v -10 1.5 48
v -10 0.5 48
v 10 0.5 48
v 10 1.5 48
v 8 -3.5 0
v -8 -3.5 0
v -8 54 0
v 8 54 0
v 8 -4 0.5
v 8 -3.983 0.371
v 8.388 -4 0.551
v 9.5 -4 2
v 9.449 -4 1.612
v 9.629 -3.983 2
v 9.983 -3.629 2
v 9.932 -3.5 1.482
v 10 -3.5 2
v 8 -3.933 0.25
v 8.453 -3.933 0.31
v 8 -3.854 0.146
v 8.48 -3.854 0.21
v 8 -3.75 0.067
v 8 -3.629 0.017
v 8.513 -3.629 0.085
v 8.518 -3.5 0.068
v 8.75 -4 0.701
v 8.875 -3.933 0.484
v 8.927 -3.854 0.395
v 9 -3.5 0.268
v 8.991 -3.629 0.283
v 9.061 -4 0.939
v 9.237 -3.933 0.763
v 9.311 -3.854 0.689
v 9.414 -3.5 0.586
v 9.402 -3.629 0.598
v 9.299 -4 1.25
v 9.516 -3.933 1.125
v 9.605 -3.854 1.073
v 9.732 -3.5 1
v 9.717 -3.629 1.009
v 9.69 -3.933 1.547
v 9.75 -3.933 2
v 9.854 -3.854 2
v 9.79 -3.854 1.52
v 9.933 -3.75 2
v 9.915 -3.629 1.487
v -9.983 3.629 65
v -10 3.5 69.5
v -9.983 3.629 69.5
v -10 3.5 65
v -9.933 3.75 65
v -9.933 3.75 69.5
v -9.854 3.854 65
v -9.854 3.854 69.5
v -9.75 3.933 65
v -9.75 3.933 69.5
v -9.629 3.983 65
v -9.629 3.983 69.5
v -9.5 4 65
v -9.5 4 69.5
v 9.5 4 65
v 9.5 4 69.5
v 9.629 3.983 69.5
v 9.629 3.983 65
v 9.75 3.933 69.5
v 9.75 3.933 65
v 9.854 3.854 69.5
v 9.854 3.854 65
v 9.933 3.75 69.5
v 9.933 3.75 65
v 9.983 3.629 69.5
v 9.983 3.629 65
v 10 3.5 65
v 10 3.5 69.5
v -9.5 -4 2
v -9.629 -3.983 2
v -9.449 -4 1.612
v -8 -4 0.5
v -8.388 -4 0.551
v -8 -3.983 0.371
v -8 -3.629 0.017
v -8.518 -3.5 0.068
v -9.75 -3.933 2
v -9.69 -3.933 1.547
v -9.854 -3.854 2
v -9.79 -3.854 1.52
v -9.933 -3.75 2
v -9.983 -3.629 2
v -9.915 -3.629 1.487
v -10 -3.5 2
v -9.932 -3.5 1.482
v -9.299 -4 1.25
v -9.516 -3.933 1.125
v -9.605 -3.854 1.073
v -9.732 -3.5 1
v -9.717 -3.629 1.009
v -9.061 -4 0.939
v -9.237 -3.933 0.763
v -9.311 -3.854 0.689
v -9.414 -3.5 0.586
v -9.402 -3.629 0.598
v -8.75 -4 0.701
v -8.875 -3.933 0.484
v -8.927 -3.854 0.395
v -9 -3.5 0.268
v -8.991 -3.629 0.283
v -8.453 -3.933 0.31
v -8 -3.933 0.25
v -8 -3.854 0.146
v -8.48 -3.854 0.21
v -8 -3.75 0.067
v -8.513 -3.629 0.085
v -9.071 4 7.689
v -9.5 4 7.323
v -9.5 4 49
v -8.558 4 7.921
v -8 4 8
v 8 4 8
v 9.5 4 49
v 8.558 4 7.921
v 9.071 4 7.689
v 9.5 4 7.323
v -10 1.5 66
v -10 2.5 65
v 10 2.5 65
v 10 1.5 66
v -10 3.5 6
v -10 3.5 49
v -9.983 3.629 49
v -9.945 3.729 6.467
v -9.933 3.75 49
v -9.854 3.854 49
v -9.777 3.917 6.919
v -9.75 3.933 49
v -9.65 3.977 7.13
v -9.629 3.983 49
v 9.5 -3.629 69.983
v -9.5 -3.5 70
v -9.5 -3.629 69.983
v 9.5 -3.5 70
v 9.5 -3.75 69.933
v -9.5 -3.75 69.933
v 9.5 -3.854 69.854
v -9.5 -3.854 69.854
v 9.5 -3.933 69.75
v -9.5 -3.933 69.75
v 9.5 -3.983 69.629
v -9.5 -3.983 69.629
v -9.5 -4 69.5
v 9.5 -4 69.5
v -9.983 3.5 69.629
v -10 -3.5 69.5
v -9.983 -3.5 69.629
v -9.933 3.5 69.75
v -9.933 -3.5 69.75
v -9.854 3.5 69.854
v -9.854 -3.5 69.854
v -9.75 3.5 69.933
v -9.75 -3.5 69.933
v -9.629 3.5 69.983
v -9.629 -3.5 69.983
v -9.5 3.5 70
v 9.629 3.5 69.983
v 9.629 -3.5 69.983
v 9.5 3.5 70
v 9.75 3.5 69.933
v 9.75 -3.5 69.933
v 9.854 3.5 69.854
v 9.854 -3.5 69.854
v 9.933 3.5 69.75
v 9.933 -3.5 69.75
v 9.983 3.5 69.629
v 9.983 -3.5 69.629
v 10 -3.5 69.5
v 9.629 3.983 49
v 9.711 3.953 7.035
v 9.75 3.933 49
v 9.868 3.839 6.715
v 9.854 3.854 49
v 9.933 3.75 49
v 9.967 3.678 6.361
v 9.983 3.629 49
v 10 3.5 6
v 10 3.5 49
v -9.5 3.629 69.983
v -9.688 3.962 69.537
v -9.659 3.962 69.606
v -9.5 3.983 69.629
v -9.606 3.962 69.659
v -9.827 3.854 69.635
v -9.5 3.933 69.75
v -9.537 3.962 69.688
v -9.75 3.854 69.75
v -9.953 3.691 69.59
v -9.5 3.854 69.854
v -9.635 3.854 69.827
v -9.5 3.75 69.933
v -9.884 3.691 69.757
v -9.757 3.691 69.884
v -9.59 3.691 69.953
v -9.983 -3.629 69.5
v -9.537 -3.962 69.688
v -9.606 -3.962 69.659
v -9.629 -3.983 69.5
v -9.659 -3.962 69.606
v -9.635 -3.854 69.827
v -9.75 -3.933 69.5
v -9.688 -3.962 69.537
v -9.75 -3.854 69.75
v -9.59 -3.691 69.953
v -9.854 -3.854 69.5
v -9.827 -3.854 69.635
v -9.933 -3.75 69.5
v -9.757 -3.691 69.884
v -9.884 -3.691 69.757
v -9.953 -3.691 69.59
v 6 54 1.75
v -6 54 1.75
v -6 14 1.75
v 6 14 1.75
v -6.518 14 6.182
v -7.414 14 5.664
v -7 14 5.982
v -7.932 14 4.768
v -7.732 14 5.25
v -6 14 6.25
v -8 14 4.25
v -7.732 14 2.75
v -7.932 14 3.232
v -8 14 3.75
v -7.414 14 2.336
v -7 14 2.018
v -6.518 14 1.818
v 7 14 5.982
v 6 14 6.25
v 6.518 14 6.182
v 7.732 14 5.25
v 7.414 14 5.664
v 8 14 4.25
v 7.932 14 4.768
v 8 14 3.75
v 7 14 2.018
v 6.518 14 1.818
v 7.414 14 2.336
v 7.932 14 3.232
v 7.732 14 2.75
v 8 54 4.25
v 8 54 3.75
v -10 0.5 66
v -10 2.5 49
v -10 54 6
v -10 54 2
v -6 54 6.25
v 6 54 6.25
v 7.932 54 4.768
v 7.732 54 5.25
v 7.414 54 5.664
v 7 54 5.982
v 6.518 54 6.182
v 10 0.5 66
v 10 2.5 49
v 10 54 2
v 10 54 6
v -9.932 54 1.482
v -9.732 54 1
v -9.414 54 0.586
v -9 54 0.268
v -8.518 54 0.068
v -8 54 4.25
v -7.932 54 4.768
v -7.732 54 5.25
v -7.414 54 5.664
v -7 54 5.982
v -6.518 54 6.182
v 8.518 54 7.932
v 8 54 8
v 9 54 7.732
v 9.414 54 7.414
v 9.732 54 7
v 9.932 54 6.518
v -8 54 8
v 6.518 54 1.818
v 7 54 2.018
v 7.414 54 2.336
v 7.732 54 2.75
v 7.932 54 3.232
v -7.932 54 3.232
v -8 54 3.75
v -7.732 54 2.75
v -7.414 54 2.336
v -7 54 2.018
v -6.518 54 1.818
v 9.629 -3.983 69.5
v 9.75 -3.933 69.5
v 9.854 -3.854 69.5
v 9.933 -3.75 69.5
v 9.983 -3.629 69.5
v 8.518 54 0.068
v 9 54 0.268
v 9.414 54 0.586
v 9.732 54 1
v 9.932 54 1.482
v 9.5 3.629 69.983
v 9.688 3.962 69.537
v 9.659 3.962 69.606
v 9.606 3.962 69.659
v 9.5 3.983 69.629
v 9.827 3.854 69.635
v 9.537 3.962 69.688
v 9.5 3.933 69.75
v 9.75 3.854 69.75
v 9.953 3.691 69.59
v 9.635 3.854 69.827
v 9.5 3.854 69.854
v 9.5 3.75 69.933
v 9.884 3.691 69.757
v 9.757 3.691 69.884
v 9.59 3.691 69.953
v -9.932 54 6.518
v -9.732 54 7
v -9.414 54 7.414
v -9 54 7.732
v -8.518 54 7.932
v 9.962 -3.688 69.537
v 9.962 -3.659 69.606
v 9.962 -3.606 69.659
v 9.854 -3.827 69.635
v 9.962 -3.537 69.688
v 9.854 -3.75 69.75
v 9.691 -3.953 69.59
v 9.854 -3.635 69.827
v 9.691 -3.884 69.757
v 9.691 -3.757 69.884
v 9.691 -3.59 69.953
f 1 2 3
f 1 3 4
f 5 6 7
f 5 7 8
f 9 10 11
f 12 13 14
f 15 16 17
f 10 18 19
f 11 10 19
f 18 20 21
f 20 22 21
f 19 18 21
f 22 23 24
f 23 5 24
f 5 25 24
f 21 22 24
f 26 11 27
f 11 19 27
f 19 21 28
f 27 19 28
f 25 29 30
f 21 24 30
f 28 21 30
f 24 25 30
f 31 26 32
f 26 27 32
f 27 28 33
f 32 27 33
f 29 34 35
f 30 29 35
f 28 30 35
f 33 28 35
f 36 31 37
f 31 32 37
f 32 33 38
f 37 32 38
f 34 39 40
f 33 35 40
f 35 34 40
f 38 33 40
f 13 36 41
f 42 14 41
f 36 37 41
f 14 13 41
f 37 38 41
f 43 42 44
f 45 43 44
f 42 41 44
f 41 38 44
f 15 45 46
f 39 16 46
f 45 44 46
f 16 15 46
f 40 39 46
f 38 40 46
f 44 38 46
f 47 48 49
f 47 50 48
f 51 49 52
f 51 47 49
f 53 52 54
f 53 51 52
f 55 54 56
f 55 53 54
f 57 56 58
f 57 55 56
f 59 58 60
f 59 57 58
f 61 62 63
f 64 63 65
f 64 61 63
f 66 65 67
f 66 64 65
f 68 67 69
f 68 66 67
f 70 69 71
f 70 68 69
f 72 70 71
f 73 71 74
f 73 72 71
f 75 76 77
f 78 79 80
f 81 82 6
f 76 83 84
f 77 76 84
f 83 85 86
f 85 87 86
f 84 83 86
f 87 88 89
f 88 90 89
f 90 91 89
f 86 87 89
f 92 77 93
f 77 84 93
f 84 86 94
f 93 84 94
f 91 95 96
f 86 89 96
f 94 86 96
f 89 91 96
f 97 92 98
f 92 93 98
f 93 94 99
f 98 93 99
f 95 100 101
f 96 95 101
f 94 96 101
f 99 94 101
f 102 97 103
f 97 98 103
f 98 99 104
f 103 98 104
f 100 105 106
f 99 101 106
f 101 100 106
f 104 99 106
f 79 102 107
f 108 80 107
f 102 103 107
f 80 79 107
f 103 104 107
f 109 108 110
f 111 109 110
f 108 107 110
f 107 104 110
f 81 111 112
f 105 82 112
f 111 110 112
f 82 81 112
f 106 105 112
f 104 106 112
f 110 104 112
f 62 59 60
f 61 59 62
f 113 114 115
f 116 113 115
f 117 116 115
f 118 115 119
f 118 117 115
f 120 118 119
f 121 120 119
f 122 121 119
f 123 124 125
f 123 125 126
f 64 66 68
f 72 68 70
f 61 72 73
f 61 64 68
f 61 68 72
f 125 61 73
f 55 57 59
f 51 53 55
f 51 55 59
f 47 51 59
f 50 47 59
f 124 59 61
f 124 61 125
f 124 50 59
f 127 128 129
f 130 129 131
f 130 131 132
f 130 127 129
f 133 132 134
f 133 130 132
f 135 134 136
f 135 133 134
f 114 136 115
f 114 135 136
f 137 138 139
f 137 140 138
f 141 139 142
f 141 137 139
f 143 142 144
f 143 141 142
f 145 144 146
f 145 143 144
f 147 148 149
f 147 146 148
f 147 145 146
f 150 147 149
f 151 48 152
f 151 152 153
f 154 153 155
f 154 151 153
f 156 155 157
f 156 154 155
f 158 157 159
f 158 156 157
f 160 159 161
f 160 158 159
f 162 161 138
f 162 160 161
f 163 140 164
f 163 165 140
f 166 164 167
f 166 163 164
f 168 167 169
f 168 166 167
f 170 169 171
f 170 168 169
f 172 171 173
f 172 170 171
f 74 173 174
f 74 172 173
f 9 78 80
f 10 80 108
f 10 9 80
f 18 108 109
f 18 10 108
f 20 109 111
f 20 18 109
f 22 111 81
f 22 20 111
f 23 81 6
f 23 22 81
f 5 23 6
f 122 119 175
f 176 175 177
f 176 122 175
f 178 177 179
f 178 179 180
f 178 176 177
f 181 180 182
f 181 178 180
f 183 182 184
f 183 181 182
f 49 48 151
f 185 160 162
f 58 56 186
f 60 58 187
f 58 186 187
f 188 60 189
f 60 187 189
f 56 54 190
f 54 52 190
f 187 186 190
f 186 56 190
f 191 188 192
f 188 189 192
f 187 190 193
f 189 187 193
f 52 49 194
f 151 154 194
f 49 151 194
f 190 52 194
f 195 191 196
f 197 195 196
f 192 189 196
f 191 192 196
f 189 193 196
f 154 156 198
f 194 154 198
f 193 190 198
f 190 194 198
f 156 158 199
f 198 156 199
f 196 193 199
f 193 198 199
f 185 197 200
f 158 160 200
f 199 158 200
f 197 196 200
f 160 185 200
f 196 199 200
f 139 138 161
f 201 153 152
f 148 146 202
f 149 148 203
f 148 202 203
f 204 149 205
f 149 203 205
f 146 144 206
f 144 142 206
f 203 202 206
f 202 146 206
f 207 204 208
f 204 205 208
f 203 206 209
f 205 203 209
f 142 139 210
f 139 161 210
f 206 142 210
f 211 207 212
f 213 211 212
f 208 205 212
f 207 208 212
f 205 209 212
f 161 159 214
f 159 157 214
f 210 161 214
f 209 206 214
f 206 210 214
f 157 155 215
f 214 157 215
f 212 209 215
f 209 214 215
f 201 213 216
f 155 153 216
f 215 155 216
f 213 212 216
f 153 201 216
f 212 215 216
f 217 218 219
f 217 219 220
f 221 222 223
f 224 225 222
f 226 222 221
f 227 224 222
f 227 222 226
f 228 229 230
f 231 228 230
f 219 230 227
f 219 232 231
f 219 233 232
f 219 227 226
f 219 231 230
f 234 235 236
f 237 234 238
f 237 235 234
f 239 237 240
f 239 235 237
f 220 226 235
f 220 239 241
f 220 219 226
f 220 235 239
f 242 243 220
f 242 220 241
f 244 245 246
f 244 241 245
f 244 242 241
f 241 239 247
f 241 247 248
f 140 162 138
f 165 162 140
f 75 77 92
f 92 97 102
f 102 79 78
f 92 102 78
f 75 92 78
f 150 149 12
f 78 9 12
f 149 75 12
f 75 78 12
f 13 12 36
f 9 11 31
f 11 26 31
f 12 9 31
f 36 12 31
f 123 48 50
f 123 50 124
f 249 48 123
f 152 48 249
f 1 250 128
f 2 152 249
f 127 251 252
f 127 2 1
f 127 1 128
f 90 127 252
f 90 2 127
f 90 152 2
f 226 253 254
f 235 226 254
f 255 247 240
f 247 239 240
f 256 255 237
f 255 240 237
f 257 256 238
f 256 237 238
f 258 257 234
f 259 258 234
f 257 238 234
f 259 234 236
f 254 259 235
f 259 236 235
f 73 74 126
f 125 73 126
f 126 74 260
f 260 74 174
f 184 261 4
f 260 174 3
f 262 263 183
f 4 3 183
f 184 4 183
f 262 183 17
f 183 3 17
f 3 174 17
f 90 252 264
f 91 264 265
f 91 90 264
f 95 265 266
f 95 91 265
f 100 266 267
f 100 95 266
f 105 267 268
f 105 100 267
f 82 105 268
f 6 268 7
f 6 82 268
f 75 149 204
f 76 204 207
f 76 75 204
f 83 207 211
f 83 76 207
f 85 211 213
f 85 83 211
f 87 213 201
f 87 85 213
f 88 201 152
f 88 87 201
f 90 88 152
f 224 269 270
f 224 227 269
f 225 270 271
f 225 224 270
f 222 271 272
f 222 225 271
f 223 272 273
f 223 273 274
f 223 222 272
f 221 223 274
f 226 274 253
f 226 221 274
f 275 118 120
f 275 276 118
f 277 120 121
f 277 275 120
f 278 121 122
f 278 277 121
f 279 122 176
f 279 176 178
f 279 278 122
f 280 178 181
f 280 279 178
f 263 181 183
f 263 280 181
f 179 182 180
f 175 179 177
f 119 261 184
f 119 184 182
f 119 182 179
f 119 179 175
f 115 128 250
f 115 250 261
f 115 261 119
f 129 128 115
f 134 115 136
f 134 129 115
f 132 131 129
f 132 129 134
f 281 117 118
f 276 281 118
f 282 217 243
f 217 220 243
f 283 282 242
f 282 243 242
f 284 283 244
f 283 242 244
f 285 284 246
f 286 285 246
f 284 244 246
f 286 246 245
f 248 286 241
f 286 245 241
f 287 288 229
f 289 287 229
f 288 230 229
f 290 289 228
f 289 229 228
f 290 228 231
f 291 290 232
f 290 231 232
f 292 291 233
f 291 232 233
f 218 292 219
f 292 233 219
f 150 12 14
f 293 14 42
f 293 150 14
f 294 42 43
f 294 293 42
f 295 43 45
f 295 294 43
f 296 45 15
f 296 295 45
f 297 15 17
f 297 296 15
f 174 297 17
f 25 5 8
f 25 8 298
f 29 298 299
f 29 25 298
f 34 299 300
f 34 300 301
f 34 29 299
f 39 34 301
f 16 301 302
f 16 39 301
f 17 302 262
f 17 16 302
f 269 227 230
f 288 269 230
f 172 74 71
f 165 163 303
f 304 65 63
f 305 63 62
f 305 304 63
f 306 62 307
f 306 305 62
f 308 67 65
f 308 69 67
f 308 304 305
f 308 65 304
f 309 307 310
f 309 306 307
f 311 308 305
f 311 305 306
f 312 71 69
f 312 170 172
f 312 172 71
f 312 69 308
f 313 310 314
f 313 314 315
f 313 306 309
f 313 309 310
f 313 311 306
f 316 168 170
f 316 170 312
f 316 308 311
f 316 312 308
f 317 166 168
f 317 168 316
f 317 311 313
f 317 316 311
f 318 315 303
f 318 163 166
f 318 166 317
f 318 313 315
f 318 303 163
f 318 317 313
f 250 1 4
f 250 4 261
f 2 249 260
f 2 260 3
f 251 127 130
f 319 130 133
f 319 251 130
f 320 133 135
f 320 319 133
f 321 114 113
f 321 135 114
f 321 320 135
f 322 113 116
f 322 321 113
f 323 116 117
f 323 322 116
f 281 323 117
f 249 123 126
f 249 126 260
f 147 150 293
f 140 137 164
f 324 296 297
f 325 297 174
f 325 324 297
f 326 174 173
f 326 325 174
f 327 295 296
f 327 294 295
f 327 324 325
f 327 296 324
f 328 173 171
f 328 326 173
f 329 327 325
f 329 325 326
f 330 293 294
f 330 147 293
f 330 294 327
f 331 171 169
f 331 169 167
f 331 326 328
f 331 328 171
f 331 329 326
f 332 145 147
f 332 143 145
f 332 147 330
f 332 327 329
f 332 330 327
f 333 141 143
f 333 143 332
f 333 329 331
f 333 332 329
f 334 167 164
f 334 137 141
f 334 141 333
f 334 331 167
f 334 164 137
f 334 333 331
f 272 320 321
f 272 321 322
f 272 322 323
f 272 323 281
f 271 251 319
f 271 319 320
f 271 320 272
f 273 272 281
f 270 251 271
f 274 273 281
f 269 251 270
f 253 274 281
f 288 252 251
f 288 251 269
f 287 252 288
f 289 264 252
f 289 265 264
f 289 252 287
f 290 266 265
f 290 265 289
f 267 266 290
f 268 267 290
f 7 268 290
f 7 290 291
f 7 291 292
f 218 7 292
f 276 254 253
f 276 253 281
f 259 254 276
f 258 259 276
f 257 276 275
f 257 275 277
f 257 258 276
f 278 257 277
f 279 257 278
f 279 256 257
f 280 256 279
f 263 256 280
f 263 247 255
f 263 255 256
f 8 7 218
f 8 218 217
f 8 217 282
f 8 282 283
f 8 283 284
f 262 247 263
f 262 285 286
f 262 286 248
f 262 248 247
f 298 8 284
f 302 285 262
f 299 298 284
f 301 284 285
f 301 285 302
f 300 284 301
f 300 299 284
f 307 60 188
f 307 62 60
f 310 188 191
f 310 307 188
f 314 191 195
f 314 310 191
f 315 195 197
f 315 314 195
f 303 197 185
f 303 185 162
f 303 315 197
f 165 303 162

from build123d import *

# Parameters (mm, degrees)
SKETCH1_W           = 20
SKETCH1_H           = 8
BOSS_EXTRUDE2_DEPTH = 70
SKETCH3_W           = 20
SKETCH3_H           = 8
BOSS_EXTRUDE3_DEPTH = 50
SKETCH4_W           = 16
SKETCH4_H           = 4.5
CUT_EXTRUDE2_DEPTH  = 40
FILLET1_R           = 2
CUT_EXTRUDE3_DEPTH  = 28
FILLET3_R           = 0.5
FILLET4_R           = 2


with BuildPart() as part:
    # Sketch1 → Boss-Extrude2 (new body)
    with BuildSketch(Plane.XY):
        Rectangle(SKETCH1_W, SKETCH1_H)
    extrude(amount=BOSS_EXTRUDE2_DEPTH)

    # Sketch3 → Boss-Extrude3 (add)
    with BuildSketch(Plane(origin=(0, 4, 0), x_dir=(1, 0, 0), z_dir=(0, 1, 0))):
        with Locations((0, -4)):
            Rectangle(SKETCH3_W, SKETCH3_H)
    extrude(amount=BOSS_EXTRUDE3_DEPTH)

    # Sketch4 → Cut-Extrude2 (cut)
    with BuildSketch(Plane(origin=(0, 54, 0), x_dir=(1, 0, 0), z_dir=(0, 1, 0))):
        with Locations((0, -4)):
            Rectangle(SKETCH4_W, SKETCH4_H)
    extrude(amount=-CUT_EXTRUDE2_DEPTH, mode=Mode.SUBTRACT)

    # Fillet1
    fillet1_edges = [part.edges().sort_by_distance(p)[0] for p in [
        (-10, 29, 8),
        (10, 29, 8),
        (-10, 25, 0),
        (10, 25, 0),
    ]]
    fillet(fillet1_edges, radius=FILLET1_R)

    # Sketch5 → Cut-Extrude3 (cut)
    with BuildSketch(Plane.ZY.offset(10)):
        Polygon((65, 4), (65, 2.5), (66, 1.5), (66, 0.5), (48, 0.5), (48, 1.5), (49, 2.5), (49, 4), align=None)
    extrude(amount=-CUT_EXTRUDE3_DEPTH, mode=Mode.SUBTRACT)

    # Fillet3
    fillet3_edges = [part.edges().sort_by_distance(p)[0] for p in [
        (-10, 0, 70),
        (0, -4, 70),
        (0, -4, 0),
        (-9.414213562, -4, 0.585786438),
        (10, 0, 70),
        (9.414213562, -4, 0.585786438),
        (10, -4, 36),
        (-10, 4, 27.5),
        (-10, -4, 36),
        (-10, 4, 67.5),
        (10, 4, 67.5),
        (10, 4, 27.5),
        (0, 4, 70),
    ]]
    fillet(fillet3_edges, radius=FILLET3_R)

    # Fillet4
    fillet4_edges = [part.edges().sort_by_distance(p)[0] for p in [
        (8, 34, 1.75),
        (8, 34, 6.25),
        (-8, 34, 6.25),
        (-8, 34, 1.75),
    ]]
    fillet(fillet4_edges, radius=FILLET4_R)


solid = part.part
